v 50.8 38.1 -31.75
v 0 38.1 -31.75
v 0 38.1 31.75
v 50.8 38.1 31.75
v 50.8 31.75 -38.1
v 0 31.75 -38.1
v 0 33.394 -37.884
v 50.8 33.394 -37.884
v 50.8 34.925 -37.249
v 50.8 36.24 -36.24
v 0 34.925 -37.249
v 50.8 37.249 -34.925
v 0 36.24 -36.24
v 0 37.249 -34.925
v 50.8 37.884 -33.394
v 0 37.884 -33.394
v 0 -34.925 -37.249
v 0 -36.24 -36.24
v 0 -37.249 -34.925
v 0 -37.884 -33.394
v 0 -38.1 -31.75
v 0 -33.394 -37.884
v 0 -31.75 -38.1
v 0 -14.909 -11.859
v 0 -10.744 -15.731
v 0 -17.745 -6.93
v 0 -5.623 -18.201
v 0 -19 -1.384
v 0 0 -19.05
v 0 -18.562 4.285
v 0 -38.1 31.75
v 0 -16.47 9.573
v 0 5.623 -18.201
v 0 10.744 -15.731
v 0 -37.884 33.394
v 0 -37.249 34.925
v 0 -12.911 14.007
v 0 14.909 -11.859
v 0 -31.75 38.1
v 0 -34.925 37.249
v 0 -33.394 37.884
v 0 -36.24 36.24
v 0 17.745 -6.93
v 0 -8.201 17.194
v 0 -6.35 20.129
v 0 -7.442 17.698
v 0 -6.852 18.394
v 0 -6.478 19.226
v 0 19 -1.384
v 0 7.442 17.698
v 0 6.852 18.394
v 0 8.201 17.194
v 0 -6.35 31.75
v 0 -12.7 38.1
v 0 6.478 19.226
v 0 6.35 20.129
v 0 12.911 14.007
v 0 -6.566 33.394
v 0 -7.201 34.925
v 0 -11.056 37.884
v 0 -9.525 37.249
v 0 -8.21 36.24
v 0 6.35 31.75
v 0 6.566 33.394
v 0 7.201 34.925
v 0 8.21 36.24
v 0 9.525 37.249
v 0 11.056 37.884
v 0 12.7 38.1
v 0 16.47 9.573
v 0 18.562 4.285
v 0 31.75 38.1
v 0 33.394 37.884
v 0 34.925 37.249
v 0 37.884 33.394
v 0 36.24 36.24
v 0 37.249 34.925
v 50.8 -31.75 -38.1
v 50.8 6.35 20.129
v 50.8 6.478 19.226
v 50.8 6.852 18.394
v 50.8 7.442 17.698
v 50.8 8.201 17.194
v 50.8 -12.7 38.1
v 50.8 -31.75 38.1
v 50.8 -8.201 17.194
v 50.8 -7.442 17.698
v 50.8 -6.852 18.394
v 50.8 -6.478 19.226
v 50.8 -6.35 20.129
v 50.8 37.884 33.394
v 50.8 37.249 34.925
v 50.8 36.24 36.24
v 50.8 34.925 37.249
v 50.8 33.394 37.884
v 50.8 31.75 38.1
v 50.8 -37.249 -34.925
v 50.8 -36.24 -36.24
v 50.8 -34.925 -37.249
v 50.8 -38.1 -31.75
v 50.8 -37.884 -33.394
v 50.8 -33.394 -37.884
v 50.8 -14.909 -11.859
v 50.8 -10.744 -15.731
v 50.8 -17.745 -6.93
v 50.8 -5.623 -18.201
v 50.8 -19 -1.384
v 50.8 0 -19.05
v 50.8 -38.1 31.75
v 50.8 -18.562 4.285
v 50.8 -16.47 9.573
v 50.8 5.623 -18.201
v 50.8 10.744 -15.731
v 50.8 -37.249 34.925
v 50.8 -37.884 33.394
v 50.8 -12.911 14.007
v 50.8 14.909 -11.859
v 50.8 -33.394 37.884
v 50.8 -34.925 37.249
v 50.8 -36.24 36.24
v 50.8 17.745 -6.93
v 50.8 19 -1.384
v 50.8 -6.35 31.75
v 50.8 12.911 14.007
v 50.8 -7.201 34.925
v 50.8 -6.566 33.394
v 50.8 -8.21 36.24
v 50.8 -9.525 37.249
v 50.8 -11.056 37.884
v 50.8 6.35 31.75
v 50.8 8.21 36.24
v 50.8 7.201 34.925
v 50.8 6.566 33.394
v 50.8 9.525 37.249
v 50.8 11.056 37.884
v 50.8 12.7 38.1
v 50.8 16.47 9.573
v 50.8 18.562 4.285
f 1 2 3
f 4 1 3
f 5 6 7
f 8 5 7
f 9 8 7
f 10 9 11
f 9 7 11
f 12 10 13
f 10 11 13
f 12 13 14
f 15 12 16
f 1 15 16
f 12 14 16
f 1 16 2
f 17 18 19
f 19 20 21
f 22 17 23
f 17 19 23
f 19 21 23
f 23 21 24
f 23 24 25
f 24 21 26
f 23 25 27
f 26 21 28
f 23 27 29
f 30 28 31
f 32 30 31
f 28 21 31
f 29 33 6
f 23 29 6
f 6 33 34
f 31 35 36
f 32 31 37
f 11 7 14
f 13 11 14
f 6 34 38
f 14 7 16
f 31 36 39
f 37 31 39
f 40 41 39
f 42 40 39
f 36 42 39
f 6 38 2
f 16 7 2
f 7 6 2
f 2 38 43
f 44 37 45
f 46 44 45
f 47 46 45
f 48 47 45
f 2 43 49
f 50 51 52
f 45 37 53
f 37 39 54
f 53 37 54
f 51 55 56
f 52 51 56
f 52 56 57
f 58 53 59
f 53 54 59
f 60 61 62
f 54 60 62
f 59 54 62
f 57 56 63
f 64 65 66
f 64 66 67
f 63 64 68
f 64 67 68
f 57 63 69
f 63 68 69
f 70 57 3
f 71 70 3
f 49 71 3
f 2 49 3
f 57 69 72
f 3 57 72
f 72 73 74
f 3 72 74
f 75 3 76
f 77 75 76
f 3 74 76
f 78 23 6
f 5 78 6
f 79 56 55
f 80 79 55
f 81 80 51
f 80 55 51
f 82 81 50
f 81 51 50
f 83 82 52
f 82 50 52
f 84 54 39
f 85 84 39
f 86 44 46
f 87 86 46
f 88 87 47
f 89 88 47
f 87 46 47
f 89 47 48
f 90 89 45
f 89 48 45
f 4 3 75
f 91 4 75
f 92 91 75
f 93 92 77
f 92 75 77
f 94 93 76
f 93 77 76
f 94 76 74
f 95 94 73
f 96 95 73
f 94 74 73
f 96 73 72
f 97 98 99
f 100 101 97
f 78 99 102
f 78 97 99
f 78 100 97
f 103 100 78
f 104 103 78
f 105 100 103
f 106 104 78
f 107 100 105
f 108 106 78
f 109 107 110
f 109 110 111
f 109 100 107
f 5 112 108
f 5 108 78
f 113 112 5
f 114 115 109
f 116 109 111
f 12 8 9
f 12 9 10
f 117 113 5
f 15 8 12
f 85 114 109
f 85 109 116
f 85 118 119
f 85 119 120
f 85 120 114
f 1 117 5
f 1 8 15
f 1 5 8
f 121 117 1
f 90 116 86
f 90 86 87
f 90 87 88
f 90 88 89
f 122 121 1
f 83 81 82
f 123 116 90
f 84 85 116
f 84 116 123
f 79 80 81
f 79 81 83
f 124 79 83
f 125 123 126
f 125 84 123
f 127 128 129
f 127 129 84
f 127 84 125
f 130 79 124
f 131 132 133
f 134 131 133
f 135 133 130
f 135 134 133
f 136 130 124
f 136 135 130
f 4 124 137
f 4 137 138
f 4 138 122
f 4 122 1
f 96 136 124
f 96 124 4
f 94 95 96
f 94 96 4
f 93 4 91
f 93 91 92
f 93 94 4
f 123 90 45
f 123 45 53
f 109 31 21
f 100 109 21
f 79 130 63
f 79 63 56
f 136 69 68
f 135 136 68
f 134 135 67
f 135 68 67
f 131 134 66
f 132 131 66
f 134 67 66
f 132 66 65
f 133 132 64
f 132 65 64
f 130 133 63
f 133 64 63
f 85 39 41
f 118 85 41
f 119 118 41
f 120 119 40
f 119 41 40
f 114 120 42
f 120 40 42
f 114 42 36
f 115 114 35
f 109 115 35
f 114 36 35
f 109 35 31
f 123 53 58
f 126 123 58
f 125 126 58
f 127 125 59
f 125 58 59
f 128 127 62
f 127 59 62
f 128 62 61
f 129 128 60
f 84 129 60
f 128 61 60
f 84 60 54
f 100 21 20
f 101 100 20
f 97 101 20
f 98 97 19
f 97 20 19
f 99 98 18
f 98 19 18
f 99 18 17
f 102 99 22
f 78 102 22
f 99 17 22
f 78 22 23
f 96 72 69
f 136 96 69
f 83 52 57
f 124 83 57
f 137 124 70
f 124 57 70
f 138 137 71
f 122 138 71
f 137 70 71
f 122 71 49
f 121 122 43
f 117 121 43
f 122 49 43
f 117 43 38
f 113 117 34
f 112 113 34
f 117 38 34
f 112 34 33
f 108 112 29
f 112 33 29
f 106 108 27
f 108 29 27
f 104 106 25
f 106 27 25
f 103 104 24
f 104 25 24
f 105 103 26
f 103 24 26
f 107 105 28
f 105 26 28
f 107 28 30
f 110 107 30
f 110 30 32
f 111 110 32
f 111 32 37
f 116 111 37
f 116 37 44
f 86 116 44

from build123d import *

# Parameters (mm, degrees)
F1_DEPTH = 50.8


with BuildPart() as f1:
    # F0 (on Right) → F1 (new body)
    with BuildSketch(Plane.YZ):
        with BuildLine():
            ThreePointArc((38.1, 31.75), (36.240128, 36.240128), (31.75, 38.1))
            Line((31.75, 38.1), (12.7, 38.1))
            ThreePointArc((12.7, 38.1), (8.209872, 36.240128), (6.35, 31.75))
            Line((6.35, 31.75), (6.35, 20.128599))
            ThreePointArc((6.35, 20.128599), (6.851557, 18.393731), (8.201481, 17.194133))
            ThreePointArc((8.201481, 17.194133), (0, -19.05), (-8.201481, 17.194133))
            ThreePointArc((-8.201481, 17.194133), (-6.851557, 18.393731), (-6.35, 20.128599))
            Line((-6.35, 20.128599), (-6.35, 31.75))
            ThreePointArc((-6.35, 31.75), (-8.209872, 36.240128), (-12.7, 38.1))
            Line((-12.7, 38.1), (-31.75, 38.1))
            ThreePointArc((-31.75, 38.1), (-36.240128, 36.240128), (-38.1, 31.75))
            Line((-38.1, 31.75), (-38.1, -31.75))
            ThreePointArc((-38.1, -31.75), (-36.240128, -36.240128), (-31.75, -38.1))
            Line((-31.75, -38.1), (31.75, -38.1))
            ThreePointArc((31.75, -38.1), (36.240128, -36.240128), (38.1, -31.75))
            Line((38.1, -31.75), (38.1, 31.75))
        make_face()
    extrude(amount=F1_DEPTH)


solid = f1.part
